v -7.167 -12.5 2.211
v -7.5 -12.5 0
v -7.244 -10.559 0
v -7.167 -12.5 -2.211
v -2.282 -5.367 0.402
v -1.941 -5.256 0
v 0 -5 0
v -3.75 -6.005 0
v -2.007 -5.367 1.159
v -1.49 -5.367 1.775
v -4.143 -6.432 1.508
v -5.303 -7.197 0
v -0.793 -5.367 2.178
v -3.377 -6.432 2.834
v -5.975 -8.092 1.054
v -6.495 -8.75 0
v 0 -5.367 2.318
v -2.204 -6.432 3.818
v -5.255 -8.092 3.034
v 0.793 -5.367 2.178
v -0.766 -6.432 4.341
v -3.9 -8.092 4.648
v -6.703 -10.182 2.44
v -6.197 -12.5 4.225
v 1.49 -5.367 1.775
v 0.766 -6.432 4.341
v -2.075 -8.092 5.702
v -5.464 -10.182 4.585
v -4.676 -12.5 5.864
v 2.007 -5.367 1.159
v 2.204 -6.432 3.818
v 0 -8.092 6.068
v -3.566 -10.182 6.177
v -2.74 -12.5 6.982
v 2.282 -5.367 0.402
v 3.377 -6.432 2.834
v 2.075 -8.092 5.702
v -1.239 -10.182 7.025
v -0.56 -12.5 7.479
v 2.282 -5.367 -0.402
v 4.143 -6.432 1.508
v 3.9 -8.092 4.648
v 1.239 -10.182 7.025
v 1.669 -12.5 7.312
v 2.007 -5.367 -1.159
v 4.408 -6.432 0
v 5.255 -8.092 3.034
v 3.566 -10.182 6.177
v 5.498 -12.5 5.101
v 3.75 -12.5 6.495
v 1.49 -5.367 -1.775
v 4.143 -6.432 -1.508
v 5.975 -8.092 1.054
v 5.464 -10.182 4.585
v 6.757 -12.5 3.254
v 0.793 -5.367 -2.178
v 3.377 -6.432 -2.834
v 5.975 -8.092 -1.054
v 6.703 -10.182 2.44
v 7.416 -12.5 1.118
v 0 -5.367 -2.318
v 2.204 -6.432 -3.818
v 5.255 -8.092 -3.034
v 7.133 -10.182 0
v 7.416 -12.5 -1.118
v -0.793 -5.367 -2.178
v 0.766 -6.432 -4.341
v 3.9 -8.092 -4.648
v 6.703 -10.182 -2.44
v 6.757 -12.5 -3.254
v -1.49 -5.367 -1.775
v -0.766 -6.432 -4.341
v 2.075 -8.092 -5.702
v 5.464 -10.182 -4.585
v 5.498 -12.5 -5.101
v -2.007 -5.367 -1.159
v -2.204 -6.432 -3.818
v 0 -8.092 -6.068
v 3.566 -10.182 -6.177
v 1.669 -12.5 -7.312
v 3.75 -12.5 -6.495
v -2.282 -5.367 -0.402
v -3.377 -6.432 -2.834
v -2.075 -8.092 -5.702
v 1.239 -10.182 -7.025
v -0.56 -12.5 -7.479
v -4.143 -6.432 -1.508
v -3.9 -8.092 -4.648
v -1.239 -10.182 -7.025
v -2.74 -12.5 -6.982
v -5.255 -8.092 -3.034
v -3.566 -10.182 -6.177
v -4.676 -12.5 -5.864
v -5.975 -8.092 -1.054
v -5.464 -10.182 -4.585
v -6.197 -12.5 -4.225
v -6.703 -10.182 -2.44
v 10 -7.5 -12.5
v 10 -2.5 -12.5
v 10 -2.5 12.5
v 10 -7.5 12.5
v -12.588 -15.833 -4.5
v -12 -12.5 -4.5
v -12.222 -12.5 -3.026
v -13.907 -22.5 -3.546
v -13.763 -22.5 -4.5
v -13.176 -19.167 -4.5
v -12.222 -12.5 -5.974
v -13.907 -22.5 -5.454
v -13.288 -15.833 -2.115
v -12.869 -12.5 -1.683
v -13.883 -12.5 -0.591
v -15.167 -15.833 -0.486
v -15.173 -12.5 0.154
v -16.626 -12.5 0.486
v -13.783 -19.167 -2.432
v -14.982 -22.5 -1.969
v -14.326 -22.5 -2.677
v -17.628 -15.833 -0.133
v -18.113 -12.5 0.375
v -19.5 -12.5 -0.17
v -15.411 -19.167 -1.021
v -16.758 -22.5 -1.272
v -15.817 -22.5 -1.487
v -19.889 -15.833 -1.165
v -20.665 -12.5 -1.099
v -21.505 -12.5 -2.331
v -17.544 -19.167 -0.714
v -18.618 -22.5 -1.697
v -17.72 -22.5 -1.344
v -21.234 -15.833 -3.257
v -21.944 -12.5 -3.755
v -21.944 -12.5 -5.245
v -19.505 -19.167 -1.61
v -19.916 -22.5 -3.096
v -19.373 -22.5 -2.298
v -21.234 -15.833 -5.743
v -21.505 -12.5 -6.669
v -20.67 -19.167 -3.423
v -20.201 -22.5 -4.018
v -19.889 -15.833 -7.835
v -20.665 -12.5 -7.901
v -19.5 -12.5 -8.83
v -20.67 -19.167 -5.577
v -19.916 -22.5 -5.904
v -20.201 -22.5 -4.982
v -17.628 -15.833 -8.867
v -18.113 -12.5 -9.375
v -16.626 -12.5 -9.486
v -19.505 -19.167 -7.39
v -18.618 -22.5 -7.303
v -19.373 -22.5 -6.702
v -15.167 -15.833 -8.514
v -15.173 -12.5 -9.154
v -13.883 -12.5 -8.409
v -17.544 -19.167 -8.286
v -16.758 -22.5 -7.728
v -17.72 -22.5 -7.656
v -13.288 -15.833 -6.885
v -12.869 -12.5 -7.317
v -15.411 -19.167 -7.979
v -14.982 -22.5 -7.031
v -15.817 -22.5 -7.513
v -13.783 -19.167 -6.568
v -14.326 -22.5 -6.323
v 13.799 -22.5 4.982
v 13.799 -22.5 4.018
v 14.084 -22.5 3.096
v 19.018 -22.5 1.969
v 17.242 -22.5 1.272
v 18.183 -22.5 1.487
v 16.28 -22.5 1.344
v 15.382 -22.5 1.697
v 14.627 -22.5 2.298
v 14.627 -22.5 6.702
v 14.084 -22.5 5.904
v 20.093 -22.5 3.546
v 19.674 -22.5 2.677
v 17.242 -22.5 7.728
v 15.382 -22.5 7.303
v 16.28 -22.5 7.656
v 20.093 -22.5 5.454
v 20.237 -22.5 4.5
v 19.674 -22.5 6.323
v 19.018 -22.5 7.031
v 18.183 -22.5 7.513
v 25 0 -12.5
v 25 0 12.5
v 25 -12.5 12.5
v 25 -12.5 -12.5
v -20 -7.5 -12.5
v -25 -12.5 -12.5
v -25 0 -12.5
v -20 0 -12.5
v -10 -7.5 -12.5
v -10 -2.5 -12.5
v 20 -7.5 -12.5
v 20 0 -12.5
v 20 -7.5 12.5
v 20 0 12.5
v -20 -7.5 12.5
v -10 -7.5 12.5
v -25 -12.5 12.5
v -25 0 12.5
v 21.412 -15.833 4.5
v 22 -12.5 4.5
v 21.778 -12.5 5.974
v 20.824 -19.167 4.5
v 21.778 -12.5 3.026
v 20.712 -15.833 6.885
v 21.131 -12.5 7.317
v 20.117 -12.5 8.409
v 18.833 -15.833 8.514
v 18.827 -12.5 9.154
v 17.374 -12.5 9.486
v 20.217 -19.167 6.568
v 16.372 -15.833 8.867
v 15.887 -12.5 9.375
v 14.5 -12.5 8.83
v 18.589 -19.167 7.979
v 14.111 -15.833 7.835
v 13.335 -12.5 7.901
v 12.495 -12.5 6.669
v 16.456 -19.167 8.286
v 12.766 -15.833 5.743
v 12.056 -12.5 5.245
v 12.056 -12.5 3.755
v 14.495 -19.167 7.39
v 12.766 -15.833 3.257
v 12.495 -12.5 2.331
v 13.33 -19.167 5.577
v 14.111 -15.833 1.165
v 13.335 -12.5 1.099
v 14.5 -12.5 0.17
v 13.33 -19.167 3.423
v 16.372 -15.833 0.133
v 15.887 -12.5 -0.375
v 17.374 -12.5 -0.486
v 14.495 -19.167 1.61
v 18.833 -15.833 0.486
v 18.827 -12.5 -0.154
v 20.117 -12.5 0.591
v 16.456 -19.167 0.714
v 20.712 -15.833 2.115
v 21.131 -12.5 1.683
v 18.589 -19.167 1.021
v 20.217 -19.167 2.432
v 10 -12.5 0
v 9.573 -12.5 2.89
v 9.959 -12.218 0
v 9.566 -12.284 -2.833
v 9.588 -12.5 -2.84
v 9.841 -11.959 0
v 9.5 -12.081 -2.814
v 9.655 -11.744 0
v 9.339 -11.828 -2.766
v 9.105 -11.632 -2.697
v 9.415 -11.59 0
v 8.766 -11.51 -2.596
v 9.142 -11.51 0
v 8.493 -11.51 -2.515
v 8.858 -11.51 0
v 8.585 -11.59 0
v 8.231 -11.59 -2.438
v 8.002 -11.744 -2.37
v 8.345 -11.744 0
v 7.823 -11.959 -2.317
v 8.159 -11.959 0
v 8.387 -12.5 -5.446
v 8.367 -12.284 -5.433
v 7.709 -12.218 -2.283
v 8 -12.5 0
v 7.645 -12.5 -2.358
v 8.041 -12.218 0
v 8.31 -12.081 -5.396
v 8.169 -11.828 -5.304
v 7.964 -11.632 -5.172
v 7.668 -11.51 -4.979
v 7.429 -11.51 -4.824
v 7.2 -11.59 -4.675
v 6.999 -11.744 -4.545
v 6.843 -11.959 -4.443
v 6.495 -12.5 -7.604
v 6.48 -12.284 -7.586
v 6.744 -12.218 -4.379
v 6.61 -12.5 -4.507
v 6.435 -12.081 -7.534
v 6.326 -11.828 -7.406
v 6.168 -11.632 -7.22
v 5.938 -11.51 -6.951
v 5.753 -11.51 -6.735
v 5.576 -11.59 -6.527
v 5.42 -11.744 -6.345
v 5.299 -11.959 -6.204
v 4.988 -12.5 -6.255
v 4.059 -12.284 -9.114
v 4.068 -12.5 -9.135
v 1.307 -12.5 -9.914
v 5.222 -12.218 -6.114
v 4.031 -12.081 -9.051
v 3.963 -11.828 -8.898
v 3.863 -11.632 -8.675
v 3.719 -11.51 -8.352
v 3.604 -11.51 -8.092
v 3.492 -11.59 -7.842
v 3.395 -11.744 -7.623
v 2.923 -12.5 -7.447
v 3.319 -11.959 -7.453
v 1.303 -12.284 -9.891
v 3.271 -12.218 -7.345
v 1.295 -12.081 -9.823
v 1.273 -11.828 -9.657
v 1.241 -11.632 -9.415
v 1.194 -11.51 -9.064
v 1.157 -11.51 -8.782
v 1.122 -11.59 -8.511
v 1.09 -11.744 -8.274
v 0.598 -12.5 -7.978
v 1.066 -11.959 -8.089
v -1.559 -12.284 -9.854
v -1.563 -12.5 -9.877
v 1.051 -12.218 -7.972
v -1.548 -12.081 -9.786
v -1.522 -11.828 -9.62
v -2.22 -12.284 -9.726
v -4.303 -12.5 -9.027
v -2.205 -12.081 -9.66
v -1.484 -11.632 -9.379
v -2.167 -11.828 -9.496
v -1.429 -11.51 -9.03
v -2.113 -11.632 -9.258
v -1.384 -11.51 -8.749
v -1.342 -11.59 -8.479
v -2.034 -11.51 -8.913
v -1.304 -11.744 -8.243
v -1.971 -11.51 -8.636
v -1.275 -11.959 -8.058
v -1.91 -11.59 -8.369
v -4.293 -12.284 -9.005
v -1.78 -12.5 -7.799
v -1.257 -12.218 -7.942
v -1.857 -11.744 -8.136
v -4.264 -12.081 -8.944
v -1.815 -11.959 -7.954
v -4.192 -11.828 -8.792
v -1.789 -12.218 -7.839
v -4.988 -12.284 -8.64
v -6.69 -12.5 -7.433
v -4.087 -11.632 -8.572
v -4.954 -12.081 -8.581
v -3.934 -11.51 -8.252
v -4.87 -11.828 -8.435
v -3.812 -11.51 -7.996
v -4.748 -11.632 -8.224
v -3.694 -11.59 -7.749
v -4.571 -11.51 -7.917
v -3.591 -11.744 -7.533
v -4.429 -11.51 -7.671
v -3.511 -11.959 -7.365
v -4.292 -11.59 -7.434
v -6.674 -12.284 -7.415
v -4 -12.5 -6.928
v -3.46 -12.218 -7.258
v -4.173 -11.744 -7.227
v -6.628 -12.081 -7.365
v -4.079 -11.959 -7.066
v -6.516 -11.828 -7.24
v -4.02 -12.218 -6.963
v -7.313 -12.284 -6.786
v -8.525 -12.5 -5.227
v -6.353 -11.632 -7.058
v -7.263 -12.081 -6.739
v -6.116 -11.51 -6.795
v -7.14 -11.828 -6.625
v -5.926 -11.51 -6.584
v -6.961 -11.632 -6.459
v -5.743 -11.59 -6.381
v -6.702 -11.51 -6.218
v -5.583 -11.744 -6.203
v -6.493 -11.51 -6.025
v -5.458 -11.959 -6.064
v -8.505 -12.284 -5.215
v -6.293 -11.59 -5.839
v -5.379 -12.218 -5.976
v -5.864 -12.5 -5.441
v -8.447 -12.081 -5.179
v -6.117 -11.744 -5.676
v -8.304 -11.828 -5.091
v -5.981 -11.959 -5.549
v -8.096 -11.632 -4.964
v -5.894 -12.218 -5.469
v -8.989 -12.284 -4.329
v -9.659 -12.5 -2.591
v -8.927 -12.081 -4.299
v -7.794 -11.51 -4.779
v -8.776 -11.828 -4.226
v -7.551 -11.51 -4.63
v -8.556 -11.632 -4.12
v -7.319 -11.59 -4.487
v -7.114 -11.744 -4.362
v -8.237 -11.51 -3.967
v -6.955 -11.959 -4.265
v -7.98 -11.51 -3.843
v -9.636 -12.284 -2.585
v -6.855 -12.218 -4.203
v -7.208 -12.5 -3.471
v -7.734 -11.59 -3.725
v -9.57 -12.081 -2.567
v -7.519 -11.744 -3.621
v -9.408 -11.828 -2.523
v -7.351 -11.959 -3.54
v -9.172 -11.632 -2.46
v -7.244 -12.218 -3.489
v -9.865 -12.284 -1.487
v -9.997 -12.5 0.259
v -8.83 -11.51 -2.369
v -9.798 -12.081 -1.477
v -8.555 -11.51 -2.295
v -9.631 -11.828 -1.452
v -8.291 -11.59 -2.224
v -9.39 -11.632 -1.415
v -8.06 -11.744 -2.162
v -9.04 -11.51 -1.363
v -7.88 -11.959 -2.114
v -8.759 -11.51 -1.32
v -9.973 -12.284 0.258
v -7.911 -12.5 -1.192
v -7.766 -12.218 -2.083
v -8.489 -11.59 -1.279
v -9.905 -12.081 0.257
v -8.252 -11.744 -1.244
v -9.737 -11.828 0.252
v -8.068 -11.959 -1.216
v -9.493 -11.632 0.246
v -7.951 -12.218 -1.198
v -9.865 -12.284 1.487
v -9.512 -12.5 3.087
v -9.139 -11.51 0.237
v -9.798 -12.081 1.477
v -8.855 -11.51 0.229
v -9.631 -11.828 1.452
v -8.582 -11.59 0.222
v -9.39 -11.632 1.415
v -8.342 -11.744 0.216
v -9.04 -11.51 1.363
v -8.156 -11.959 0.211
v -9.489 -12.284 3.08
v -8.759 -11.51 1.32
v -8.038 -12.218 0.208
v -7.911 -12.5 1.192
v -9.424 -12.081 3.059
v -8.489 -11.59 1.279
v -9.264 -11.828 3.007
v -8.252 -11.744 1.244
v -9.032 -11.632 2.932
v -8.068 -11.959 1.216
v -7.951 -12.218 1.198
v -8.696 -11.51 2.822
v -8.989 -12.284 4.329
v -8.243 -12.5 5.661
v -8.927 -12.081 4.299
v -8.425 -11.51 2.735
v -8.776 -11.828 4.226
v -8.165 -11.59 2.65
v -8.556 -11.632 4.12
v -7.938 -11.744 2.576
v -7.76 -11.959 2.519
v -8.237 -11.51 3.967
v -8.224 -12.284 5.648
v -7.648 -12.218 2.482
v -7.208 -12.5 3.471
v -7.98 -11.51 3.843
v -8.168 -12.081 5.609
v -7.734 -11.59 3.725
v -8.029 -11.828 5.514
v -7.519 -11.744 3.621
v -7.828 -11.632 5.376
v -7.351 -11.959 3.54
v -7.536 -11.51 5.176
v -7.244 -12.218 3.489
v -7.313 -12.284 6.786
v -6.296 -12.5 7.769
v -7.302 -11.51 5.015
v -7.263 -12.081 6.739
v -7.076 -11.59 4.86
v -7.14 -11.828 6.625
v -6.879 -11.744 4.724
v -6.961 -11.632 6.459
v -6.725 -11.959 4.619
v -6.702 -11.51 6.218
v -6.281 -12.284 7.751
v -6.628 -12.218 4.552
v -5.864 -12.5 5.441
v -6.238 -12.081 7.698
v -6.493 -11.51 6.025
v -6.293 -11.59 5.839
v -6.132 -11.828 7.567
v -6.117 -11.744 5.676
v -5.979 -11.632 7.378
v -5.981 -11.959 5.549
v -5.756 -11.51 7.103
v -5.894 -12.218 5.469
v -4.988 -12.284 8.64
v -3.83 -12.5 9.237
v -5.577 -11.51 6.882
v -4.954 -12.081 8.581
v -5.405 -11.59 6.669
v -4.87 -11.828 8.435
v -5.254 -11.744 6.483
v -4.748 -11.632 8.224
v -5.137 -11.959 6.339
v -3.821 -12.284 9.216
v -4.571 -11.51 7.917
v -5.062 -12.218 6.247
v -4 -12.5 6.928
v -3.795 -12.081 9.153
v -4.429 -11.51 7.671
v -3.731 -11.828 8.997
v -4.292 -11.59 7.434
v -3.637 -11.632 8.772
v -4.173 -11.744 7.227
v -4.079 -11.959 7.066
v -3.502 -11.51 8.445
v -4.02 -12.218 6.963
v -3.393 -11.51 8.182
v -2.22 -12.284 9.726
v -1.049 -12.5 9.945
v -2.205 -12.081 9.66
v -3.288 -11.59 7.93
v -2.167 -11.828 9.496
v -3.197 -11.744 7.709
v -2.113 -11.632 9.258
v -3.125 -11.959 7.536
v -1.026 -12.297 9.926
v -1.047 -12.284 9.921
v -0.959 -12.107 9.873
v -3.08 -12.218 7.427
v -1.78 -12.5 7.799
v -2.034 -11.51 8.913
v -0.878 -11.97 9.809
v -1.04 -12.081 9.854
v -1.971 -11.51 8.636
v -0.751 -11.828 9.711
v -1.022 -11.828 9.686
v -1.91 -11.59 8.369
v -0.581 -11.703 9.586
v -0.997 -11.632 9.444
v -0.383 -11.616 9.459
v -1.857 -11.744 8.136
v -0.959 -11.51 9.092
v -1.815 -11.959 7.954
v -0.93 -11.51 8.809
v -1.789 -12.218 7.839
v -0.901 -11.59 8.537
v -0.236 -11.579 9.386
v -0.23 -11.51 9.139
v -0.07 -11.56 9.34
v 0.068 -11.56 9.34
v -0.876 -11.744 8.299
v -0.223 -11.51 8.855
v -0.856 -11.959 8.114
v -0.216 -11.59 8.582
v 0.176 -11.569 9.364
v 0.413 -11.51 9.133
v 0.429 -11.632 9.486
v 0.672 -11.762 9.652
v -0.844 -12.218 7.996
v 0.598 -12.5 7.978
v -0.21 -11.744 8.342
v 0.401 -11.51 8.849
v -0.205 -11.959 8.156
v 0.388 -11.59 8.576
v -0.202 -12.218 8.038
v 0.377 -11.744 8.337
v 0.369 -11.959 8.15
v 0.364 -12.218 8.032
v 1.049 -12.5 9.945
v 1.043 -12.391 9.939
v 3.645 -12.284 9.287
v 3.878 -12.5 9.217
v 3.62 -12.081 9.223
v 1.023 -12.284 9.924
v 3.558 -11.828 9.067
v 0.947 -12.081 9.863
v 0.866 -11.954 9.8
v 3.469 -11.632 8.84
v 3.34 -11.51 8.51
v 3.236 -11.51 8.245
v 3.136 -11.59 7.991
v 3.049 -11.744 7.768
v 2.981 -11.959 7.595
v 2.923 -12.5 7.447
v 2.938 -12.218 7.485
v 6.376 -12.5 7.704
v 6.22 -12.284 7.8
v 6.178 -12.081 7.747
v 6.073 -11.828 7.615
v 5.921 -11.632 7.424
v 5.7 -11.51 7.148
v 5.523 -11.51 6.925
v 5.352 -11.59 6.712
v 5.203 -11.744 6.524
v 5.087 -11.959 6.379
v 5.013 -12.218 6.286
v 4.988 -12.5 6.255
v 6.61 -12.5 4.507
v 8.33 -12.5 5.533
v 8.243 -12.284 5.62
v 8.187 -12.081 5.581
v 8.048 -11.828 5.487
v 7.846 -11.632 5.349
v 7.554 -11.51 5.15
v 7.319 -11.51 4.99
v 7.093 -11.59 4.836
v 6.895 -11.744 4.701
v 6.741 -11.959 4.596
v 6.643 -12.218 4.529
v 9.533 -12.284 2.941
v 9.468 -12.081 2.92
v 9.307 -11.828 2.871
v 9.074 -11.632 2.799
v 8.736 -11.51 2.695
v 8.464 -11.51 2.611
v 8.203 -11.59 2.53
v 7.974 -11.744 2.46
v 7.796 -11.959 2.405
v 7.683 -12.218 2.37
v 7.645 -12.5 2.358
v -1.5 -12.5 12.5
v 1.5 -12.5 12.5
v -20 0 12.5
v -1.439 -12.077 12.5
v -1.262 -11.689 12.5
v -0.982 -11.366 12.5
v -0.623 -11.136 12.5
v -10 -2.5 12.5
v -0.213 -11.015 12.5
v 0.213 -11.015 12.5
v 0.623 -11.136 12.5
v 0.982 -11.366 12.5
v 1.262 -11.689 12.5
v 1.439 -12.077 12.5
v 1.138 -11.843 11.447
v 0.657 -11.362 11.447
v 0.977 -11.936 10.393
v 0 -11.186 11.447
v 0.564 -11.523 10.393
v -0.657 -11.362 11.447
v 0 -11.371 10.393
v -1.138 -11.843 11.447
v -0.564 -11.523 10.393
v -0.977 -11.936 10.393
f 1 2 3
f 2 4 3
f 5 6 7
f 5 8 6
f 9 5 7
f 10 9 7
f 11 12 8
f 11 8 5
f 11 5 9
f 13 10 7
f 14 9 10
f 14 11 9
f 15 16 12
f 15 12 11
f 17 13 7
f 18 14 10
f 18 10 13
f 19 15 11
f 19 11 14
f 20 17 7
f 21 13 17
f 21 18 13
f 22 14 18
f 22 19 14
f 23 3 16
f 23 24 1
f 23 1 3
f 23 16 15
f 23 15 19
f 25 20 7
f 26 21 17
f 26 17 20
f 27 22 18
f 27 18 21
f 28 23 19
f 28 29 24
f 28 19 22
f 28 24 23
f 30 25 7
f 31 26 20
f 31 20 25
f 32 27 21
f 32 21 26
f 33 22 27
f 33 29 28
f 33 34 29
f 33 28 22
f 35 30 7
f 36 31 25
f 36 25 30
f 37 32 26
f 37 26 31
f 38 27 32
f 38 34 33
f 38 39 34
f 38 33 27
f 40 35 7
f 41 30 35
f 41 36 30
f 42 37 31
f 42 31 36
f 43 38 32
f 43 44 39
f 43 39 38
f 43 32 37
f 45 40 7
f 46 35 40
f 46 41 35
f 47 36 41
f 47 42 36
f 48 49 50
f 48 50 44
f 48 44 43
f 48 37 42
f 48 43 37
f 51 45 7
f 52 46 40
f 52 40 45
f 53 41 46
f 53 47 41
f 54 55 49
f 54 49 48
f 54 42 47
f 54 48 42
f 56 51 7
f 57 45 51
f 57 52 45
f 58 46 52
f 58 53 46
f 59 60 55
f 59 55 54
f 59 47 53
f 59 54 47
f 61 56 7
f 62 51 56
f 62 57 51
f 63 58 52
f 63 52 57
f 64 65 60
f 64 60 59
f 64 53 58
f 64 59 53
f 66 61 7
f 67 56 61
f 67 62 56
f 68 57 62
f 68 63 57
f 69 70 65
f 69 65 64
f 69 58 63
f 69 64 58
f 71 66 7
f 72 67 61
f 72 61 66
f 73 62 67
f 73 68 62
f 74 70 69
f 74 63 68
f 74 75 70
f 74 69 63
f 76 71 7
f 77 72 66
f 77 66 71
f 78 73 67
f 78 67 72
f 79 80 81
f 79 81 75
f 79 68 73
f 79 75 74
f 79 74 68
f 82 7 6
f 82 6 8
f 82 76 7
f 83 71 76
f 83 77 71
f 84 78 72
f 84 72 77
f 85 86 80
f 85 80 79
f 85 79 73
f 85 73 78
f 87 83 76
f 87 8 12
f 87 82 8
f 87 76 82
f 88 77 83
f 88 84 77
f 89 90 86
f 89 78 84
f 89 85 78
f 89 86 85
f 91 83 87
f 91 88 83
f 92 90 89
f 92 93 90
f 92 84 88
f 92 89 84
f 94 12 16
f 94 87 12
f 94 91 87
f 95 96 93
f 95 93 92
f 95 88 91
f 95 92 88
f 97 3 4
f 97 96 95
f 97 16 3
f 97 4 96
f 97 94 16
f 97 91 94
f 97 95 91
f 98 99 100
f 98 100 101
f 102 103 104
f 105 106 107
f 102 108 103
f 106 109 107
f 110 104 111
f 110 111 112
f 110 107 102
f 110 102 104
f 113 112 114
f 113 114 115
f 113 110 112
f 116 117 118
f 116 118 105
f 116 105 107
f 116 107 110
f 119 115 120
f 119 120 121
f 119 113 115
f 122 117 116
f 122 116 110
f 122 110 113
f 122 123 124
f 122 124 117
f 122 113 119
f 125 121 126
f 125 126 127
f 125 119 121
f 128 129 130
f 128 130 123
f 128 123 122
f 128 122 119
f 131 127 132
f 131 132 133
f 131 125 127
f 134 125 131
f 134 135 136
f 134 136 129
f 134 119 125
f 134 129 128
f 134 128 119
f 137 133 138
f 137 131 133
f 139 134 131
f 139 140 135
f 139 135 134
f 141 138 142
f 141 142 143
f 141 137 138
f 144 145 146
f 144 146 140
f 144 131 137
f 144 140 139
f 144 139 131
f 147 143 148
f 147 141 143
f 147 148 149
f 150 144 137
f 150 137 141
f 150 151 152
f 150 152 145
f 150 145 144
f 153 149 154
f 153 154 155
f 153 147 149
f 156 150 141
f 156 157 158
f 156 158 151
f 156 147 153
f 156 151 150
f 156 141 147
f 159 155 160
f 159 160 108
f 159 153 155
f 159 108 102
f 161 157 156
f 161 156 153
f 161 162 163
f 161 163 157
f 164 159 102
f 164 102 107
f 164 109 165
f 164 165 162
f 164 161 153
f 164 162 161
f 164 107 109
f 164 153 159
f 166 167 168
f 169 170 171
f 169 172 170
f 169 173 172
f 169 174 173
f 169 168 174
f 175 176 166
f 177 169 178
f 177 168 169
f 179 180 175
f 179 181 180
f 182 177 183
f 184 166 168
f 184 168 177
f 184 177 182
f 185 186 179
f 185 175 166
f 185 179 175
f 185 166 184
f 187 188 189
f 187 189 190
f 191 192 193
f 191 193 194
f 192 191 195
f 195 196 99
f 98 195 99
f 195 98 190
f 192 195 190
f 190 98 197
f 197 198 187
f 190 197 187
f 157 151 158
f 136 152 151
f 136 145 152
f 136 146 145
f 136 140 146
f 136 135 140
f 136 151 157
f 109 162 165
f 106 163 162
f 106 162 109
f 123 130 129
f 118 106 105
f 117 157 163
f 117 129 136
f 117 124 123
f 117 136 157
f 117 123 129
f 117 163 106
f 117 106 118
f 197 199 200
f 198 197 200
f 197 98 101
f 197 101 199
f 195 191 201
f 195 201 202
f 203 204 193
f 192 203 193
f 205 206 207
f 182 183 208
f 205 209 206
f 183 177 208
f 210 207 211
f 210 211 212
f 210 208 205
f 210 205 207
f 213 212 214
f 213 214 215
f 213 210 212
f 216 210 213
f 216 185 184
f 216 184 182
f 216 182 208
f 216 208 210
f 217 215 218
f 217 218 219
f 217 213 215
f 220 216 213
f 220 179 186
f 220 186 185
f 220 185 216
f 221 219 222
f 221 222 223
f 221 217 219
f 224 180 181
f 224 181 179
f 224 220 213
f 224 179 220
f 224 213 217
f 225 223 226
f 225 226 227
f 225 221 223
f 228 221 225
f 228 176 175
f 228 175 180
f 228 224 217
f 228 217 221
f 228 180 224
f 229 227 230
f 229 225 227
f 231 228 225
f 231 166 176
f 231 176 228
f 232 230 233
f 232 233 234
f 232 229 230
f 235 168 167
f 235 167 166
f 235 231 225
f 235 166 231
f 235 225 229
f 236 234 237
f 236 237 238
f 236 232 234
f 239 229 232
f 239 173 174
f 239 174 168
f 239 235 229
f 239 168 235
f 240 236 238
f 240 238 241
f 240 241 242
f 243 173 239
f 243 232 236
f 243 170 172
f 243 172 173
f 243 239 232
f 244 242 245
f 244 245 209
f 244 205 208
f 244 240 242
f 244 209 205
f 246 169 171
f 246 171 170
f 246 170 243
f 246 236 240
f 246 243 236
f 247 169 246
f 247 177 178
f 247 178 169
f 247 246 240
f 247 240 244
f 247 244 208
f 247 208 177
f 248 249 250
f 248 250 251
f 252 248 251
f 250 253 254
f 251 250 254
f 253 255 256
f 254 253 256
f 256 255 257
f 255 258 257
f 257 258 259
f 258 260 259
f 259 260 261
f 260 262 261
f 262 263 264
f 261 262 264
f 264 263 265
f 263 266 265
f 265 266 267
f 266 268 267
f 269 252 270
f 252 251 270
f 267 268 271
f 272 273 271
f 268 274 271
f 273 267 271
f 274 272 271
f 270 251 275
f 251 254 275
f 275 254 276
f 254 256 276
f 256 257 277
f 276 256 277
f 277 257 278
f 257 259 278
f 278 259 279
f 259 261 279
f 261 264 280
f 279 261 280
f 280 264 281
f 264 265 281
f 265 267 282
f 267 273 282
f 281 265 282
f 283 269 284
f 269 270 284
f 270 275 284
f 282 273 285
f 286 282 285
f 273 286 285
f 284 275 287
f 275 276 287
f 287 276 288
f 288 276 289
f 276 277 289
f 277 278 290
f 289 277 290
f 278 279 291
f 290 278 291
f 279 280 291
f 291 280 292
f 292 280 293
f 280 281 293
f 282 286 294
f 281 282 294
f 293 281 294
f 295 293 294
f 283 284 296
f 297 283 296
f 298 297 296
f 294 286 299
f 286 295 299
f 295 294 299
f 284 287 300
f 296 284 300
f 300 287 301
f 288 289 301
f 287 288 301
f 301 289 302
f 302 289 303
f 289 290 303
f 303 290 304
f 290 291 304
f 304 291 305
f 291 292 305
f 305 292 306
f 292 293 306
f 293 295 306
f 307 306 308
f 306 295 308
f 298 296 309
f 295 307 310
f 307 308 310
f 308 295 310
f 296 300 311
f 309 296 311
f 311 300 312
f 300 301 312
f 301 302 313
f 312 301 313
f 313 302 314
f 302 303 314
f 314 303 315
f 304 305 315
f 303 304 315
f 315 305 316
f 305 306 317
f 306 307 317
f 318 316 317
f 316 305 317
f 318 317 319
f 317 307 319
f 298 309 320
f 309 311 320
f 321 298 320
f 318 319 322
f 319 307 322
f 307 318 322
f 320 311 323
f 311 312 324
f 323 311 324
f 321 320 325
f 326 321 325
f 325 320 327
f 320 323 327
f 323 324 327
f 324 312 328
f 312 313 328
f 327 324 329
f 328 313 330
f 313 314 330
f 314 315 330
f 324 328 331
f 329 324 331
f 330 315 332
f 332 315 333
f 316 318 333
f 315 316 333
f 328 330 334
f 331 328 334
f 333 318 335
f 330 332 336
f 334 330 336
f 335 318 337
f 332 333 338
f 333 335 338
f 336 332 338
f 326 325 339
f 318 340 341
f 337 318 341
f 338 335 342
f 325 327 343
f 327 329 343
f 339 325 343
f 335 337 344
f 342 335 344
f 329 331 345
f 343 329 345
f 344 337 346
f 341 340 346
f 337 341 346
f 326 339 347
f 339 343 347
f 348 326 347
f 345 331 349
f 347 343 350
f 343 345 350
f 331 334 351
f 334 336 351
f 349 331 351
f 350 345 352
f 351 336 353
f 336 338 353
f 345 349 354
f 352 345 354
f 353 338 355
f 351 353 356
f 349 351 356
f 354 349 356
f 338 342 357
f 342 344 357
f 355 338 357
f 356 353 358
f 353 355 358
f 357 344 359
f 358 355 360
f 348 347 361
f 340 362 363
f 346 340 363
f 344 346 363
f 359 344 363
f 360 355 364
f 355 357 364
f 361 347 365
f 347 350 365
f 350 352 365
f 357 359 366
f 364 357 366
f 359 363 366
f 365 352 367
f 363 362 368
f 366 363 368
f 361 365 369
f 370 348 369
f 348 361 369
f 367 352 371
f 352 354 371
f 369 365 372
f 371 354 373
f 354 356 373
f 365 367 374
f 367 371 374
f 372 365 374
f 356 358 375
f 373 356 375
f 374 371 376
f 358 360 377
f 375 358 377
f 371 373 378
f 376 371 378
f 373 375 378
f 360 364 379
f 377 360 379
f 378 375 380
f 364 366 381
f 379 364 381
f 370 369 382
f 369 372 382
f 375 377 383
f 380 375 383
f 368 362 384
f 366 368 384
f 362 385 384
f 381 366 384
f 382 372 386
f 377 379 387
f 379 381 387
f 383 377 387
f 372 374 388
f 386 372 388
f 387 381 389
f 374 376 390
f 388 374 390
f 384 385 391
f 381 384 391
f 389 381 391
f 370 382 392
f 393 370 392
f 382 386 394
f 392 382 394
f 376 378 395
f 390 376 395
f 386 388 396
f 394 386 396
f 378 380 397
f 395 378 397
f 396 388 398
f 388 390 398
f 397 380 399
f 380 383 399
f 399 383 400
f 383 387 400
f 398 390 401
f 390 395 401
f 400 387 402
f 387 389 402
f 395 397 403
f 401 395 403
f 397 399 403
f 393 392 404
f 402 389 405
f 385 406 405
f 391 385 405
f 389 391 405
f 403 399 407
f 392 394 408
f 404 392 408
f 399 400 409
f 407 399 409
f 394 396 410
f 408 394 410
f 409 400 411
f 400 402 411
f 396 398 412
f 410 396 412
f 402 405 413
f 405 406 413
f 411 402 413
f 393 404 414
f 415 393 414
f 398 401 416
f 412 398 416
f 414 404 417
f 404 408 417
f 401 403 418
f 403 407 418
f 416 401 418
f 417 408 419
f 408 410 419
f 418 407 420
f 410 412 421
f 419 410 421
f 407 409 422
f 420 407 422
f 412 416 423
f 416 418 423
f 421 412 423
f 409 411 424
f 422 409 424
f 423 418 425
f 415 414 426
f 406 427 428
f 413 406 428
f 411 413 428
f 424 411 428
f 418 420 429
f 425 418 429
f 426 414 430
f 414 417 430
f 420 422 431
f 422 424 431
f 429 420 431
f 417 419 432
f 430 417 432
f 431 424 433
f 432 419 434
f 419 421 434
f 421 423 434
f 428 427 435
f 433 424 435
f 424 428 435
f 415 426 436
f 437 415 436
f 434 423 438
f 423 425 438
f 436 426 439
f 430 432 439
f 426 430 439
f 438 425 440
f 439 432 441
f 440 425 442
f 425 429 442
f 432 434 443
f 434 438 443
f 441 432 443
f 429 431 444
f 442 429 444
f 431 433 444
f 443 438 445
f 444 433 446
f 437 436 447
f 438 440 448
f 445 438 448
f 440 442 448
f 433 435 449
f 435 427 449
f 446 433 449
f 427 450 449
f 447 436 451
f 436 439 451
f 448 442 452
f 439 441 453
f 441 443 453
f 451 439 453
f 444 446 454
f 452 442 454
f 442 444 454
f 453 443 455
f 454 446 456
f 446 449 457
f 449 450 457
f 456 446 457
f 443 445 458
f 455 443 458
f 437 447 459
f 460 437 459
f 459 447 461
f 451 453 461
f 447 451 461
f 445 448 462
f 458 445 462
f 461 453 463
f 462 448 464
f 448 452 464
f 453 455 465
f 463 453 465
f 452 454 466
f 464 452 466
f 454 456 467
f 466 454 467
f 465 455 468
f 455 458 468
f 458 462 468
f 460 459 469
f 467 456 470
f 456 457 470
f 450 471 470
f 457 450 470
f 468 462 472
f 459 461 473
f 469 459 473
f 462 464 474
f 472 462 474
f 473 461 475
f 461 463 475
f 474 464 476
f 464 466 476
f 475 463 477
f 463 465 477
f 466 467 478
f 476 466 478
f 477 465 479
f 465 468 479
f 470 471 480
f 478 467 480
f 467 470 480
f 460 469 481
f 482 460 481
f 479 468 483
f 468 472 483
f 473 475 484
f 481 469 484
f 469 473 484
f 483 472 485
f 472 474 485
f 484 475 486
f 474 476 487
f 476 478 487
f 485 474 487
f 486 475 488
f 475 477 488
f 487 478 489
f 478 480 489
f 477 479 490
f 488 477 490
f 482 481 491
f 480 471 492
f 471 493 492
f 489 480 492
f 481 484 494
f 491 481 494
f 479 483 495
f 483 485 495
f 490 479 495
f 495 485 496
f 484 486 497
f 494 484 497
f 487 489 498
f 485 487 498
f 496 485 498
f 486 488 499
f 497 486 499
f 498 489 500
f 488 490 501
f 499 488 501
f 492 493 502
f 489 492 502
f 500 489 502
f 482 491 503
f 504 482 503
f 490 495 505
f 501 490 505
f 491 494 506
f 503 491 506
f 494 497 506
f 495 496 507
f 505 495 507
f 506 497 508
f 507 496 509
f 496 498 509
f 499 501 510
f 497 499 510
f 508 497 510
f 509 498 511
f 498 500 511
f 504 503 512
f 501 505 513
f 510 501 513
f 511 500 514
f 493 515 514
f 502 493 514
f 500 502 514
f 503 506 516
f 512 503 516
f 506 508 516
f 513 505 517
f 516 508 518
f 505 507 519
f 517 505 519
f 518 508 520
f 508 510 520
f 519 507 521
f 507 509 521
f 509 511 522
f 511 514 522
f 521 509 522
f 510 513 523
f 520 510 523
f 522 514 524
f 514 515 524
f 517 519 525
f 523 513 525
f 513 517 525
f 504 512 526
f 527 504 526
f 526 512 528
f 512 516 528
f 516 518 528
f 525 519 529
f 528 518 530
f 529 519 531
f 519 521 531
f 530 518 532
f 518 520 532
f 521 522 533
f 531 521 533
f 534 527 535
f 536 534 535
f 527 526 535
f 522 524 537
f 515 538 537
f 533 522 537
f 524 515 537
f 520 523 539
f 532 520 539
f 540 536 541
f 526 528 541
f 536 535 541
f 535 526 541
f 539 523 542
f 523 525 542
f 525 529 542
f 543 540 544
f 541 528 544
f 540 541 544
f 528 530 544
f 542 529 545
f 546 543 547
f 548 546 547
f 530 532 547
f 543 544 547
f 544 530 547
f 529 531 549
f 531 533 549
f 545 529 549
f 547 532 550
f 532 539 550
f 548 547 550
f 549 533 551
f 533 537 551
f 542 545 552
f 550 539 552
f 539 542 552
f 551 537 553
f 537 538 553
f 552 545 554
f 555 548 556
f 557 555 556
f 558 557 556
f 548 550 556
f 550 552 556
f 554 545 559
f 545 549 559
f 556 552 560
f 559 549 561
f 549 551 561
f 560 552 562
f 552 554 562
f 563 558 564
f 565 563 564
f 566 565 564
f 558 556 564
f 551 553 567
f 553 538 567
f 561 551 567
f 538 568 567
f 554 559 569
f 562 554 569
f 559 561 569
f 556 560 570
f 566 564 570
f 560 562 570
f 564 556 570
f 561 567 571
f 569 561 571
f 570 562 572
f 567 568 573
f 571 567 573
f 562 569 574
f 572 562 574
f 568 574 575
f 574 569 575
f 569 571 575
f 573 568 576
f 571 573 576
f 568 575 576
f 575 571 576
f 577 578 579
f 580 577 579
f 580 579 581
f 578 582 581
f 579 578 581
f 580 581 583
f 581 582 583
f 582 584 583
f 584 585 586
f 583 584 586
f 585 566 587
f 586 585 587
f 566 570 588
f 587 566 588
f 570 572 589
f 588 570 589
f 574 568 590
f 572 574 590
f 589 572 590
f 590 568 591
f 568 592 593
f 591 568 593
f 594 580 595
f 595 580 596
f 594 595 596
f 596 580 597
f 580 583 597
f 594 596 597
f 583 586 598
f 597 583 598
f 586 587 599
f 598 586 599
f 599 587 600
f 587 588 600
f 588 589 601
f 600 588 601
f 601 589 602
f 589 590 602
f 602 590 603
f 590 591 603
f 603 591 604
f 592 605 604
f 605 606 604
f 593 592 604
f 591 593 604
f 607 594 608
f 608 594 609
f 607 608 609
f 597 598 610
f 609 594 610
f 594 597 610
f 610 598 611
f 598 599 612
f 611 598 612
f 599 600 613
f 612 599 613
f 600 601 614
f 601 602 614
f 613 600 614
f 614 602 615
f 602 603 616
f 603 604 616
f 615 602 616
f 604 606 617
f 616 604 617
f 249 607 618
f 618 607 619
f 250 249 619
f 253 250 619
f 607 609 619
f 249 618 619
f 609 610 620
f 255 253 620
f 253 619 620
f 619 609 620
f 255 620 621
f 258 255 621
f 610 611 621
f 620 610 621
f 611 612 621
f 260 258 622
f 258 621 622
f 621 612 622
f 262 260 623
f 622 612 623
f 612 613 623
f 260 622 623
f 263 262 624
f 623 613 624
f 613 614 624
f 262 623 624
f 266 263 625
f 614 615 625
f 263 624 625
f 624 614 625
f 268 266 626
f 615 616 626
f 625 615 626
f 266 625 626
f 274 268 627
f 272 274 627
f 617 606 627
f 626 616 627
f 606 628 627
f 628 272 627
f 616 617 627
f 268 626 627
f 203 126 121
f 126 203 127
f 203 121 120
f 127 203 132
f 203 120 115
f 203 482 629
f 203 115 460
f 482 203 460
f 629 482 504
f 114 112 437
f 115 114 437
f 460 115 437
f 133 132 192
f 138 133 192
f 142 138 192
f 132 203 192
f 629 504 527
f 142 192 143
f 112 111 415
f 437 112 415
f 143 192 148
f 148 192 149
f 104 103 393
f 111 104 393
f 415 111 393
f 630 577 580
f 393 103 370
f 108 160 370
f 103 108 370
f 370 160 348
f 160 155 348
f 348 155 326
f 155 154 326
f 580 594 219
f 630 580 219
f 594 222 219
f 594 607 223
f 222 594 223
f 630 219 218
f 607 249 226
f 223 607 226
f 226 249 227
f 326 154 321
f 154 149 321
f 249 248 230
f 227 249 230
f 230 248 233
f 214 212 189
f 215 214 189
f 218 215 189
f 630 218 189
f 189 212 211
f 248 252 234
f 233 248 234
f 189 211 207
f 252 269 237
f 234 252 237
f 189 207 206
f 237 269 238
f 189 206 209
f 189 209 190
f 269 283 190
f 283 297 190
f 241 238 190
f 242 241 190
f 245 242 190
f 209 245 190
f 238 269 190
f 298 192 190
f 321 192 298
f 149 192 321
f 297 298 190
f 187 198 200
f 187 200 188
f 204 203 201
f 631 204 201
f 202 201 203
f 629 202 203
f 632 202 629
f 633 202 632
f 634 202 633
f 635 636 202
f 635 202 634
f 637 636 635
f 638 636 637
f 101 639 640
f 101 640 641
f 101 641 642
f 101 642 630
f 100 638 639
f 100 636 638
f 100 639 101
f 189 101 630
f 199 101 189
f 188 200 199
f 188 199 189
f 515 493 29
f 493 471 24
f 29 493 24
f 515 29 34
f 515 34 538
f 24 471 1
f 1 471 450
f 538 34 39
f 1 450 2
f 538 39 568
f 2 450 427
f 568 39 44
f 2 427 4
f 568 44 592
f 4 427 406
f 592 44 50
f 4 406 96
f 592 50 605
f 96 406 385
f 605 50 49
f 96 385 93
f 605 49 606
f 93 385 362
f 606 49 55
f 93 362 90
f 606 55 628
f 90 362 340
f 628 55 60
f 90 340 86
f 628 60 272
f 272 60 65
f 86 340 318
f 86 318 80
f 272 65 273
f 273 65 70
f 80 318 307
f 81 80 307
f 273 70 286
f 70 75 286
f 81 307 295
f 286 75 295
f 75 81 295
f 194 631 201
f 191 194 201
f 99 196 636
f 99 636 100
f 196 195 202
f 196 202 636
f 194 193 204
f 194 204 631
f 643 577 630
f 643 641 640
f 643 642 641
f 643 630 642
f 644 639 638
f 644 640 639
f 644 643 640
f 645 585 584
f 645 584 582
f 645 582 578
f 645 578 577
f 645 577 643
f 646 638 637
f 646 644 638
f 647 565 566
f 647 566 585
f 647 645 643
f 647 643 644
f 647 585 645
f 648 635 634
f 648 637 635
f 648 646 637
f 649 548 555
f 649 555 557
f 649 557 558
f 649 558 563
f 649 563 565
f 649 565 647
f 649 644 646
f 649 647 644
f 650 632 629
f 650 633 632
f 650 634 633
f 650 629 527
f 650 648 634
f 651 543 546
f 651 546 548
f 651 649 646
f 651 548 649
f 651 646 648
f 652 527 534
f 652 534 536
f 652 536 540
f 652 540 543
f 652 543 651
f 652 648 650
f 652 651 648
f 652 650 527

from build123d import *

# Parameters (mm, degrees)
ESQUISSE1_W             = 50
ESQUISSE1_H             = 25
BOSS_EXTRU_1_DEPTH      = 12.5
ESQUISSE2_R             = 5
BOSS_EXTRU_2_DEPTH      = 10
BOSS_EXTRU_2_TAPER      = 10
ESQUISSE4_R             = 5
BOSS_EXTRU_3_DEPTH      = 10
BOSS_EXTRU_3_TAPER      = 10
ENL_V_MAT_EXTRU_5_DEPTH = 26
ESQUISSE14_R            = 1.5
ENL_V_MAT_EXTRU_6_DEPTH = 4
ENL_V_MAT_EXTRU_6_TAPER = 10


with BuildPart() as part:
    # Esquisse1 → Boss.-Extru.1 (new body)
    with BuildSketch(Plane(origin=(0, 0, 0), x_dir=(1, 0, 0), z_dir=(0, 1, 0))):
        Rectangle(ESQUISSE1_W, ESQUISSE1_H)
    extrude(amount=-BOSS_EXTRU_1_DEPTH)

    # Esquisse2 → Boss.-Extru.2 (add)
    with BuildSketch(Plane.XZ.offset(12.5)):
        with Locations((17, 4.5)):
            Circle(ESQUISSE2_R)
    extrude(amount=BOSS_EXTRU_2_DEPTH, taper=BOSS_EXTRU_2_TAPER)

    # Esquisse4 → Boss.-Extru.3 (add)
    with BuildSketch(Plane.XZ.offset(12.5)):
        with Locations((-17, -4.5)):
            Circle(ESQUISSE4_R)
    extrude(amount=BOSS_EXTRU_3_DEPTH, taper=BOSS_EXTRU_3_TAPER)

    # Esquisse6 → Enlèvement de matière-Révolution1 (revolve, cut)
    with BuildSketch(Plane.XY):
        with BuildLine():
            Line((0, -20), (0, -5))
            ThreePointArc((0, -5), (-7.5, -12.5), (0, -20))
        make_face()
    revolve(axis=Axis((0, -20, 0), (0, 1, 0)), mode=Mode.SUBTRACT)

    # Esquisse8 → Enlèvement de matière-Révolution2 (revolve, cut)
    with BuildSketch(Plane.XY):
        with BuildLine():
            Line((8, -12.5), (10, -12.5))
            ThreePointArc((10, -12.5), (9, -11.5), (8, -12.5))
        make_face()
    revolve(axis=Axis((0, -20, 0), (0, 1, 0)), mode=Mode.SUBTRACT)

    # Esquisse13 → Enlèv. mat.-Extru.5 (cut, through all)
    with BuildSketch(Plane(origin=(0, 0, -12.5), x_dir=(-1, 0, 0), z_dir=(0, 0, -1))):
        Polygon((20, 0), (20, -7.5), (10, -7.5), (10, -2.5), (-10, -2.5), (-10, -7.5), (-20, -7.5), (-20, 0), align=None)
    extrude(amount=-ENL_V_MAT_EXTRU_5_DEPTH, mode=Mode.SUBTRACT)

    # Esquisse14 → Enlèv. mat.-Extru.6 (cut)
    with BuildSketch(Plane.XY.offset(12.5)):
        with Locations((0, -12.5)):
            Circle(ESQUISSE14_R)
    extrude(amount=-ENL_V_MAT_EXTRU_6_DEPTH, taper=ENL_V_MAT_EXTRU_6_TAPER, mode=Mode.SUBTRACT)


solid = part.part
